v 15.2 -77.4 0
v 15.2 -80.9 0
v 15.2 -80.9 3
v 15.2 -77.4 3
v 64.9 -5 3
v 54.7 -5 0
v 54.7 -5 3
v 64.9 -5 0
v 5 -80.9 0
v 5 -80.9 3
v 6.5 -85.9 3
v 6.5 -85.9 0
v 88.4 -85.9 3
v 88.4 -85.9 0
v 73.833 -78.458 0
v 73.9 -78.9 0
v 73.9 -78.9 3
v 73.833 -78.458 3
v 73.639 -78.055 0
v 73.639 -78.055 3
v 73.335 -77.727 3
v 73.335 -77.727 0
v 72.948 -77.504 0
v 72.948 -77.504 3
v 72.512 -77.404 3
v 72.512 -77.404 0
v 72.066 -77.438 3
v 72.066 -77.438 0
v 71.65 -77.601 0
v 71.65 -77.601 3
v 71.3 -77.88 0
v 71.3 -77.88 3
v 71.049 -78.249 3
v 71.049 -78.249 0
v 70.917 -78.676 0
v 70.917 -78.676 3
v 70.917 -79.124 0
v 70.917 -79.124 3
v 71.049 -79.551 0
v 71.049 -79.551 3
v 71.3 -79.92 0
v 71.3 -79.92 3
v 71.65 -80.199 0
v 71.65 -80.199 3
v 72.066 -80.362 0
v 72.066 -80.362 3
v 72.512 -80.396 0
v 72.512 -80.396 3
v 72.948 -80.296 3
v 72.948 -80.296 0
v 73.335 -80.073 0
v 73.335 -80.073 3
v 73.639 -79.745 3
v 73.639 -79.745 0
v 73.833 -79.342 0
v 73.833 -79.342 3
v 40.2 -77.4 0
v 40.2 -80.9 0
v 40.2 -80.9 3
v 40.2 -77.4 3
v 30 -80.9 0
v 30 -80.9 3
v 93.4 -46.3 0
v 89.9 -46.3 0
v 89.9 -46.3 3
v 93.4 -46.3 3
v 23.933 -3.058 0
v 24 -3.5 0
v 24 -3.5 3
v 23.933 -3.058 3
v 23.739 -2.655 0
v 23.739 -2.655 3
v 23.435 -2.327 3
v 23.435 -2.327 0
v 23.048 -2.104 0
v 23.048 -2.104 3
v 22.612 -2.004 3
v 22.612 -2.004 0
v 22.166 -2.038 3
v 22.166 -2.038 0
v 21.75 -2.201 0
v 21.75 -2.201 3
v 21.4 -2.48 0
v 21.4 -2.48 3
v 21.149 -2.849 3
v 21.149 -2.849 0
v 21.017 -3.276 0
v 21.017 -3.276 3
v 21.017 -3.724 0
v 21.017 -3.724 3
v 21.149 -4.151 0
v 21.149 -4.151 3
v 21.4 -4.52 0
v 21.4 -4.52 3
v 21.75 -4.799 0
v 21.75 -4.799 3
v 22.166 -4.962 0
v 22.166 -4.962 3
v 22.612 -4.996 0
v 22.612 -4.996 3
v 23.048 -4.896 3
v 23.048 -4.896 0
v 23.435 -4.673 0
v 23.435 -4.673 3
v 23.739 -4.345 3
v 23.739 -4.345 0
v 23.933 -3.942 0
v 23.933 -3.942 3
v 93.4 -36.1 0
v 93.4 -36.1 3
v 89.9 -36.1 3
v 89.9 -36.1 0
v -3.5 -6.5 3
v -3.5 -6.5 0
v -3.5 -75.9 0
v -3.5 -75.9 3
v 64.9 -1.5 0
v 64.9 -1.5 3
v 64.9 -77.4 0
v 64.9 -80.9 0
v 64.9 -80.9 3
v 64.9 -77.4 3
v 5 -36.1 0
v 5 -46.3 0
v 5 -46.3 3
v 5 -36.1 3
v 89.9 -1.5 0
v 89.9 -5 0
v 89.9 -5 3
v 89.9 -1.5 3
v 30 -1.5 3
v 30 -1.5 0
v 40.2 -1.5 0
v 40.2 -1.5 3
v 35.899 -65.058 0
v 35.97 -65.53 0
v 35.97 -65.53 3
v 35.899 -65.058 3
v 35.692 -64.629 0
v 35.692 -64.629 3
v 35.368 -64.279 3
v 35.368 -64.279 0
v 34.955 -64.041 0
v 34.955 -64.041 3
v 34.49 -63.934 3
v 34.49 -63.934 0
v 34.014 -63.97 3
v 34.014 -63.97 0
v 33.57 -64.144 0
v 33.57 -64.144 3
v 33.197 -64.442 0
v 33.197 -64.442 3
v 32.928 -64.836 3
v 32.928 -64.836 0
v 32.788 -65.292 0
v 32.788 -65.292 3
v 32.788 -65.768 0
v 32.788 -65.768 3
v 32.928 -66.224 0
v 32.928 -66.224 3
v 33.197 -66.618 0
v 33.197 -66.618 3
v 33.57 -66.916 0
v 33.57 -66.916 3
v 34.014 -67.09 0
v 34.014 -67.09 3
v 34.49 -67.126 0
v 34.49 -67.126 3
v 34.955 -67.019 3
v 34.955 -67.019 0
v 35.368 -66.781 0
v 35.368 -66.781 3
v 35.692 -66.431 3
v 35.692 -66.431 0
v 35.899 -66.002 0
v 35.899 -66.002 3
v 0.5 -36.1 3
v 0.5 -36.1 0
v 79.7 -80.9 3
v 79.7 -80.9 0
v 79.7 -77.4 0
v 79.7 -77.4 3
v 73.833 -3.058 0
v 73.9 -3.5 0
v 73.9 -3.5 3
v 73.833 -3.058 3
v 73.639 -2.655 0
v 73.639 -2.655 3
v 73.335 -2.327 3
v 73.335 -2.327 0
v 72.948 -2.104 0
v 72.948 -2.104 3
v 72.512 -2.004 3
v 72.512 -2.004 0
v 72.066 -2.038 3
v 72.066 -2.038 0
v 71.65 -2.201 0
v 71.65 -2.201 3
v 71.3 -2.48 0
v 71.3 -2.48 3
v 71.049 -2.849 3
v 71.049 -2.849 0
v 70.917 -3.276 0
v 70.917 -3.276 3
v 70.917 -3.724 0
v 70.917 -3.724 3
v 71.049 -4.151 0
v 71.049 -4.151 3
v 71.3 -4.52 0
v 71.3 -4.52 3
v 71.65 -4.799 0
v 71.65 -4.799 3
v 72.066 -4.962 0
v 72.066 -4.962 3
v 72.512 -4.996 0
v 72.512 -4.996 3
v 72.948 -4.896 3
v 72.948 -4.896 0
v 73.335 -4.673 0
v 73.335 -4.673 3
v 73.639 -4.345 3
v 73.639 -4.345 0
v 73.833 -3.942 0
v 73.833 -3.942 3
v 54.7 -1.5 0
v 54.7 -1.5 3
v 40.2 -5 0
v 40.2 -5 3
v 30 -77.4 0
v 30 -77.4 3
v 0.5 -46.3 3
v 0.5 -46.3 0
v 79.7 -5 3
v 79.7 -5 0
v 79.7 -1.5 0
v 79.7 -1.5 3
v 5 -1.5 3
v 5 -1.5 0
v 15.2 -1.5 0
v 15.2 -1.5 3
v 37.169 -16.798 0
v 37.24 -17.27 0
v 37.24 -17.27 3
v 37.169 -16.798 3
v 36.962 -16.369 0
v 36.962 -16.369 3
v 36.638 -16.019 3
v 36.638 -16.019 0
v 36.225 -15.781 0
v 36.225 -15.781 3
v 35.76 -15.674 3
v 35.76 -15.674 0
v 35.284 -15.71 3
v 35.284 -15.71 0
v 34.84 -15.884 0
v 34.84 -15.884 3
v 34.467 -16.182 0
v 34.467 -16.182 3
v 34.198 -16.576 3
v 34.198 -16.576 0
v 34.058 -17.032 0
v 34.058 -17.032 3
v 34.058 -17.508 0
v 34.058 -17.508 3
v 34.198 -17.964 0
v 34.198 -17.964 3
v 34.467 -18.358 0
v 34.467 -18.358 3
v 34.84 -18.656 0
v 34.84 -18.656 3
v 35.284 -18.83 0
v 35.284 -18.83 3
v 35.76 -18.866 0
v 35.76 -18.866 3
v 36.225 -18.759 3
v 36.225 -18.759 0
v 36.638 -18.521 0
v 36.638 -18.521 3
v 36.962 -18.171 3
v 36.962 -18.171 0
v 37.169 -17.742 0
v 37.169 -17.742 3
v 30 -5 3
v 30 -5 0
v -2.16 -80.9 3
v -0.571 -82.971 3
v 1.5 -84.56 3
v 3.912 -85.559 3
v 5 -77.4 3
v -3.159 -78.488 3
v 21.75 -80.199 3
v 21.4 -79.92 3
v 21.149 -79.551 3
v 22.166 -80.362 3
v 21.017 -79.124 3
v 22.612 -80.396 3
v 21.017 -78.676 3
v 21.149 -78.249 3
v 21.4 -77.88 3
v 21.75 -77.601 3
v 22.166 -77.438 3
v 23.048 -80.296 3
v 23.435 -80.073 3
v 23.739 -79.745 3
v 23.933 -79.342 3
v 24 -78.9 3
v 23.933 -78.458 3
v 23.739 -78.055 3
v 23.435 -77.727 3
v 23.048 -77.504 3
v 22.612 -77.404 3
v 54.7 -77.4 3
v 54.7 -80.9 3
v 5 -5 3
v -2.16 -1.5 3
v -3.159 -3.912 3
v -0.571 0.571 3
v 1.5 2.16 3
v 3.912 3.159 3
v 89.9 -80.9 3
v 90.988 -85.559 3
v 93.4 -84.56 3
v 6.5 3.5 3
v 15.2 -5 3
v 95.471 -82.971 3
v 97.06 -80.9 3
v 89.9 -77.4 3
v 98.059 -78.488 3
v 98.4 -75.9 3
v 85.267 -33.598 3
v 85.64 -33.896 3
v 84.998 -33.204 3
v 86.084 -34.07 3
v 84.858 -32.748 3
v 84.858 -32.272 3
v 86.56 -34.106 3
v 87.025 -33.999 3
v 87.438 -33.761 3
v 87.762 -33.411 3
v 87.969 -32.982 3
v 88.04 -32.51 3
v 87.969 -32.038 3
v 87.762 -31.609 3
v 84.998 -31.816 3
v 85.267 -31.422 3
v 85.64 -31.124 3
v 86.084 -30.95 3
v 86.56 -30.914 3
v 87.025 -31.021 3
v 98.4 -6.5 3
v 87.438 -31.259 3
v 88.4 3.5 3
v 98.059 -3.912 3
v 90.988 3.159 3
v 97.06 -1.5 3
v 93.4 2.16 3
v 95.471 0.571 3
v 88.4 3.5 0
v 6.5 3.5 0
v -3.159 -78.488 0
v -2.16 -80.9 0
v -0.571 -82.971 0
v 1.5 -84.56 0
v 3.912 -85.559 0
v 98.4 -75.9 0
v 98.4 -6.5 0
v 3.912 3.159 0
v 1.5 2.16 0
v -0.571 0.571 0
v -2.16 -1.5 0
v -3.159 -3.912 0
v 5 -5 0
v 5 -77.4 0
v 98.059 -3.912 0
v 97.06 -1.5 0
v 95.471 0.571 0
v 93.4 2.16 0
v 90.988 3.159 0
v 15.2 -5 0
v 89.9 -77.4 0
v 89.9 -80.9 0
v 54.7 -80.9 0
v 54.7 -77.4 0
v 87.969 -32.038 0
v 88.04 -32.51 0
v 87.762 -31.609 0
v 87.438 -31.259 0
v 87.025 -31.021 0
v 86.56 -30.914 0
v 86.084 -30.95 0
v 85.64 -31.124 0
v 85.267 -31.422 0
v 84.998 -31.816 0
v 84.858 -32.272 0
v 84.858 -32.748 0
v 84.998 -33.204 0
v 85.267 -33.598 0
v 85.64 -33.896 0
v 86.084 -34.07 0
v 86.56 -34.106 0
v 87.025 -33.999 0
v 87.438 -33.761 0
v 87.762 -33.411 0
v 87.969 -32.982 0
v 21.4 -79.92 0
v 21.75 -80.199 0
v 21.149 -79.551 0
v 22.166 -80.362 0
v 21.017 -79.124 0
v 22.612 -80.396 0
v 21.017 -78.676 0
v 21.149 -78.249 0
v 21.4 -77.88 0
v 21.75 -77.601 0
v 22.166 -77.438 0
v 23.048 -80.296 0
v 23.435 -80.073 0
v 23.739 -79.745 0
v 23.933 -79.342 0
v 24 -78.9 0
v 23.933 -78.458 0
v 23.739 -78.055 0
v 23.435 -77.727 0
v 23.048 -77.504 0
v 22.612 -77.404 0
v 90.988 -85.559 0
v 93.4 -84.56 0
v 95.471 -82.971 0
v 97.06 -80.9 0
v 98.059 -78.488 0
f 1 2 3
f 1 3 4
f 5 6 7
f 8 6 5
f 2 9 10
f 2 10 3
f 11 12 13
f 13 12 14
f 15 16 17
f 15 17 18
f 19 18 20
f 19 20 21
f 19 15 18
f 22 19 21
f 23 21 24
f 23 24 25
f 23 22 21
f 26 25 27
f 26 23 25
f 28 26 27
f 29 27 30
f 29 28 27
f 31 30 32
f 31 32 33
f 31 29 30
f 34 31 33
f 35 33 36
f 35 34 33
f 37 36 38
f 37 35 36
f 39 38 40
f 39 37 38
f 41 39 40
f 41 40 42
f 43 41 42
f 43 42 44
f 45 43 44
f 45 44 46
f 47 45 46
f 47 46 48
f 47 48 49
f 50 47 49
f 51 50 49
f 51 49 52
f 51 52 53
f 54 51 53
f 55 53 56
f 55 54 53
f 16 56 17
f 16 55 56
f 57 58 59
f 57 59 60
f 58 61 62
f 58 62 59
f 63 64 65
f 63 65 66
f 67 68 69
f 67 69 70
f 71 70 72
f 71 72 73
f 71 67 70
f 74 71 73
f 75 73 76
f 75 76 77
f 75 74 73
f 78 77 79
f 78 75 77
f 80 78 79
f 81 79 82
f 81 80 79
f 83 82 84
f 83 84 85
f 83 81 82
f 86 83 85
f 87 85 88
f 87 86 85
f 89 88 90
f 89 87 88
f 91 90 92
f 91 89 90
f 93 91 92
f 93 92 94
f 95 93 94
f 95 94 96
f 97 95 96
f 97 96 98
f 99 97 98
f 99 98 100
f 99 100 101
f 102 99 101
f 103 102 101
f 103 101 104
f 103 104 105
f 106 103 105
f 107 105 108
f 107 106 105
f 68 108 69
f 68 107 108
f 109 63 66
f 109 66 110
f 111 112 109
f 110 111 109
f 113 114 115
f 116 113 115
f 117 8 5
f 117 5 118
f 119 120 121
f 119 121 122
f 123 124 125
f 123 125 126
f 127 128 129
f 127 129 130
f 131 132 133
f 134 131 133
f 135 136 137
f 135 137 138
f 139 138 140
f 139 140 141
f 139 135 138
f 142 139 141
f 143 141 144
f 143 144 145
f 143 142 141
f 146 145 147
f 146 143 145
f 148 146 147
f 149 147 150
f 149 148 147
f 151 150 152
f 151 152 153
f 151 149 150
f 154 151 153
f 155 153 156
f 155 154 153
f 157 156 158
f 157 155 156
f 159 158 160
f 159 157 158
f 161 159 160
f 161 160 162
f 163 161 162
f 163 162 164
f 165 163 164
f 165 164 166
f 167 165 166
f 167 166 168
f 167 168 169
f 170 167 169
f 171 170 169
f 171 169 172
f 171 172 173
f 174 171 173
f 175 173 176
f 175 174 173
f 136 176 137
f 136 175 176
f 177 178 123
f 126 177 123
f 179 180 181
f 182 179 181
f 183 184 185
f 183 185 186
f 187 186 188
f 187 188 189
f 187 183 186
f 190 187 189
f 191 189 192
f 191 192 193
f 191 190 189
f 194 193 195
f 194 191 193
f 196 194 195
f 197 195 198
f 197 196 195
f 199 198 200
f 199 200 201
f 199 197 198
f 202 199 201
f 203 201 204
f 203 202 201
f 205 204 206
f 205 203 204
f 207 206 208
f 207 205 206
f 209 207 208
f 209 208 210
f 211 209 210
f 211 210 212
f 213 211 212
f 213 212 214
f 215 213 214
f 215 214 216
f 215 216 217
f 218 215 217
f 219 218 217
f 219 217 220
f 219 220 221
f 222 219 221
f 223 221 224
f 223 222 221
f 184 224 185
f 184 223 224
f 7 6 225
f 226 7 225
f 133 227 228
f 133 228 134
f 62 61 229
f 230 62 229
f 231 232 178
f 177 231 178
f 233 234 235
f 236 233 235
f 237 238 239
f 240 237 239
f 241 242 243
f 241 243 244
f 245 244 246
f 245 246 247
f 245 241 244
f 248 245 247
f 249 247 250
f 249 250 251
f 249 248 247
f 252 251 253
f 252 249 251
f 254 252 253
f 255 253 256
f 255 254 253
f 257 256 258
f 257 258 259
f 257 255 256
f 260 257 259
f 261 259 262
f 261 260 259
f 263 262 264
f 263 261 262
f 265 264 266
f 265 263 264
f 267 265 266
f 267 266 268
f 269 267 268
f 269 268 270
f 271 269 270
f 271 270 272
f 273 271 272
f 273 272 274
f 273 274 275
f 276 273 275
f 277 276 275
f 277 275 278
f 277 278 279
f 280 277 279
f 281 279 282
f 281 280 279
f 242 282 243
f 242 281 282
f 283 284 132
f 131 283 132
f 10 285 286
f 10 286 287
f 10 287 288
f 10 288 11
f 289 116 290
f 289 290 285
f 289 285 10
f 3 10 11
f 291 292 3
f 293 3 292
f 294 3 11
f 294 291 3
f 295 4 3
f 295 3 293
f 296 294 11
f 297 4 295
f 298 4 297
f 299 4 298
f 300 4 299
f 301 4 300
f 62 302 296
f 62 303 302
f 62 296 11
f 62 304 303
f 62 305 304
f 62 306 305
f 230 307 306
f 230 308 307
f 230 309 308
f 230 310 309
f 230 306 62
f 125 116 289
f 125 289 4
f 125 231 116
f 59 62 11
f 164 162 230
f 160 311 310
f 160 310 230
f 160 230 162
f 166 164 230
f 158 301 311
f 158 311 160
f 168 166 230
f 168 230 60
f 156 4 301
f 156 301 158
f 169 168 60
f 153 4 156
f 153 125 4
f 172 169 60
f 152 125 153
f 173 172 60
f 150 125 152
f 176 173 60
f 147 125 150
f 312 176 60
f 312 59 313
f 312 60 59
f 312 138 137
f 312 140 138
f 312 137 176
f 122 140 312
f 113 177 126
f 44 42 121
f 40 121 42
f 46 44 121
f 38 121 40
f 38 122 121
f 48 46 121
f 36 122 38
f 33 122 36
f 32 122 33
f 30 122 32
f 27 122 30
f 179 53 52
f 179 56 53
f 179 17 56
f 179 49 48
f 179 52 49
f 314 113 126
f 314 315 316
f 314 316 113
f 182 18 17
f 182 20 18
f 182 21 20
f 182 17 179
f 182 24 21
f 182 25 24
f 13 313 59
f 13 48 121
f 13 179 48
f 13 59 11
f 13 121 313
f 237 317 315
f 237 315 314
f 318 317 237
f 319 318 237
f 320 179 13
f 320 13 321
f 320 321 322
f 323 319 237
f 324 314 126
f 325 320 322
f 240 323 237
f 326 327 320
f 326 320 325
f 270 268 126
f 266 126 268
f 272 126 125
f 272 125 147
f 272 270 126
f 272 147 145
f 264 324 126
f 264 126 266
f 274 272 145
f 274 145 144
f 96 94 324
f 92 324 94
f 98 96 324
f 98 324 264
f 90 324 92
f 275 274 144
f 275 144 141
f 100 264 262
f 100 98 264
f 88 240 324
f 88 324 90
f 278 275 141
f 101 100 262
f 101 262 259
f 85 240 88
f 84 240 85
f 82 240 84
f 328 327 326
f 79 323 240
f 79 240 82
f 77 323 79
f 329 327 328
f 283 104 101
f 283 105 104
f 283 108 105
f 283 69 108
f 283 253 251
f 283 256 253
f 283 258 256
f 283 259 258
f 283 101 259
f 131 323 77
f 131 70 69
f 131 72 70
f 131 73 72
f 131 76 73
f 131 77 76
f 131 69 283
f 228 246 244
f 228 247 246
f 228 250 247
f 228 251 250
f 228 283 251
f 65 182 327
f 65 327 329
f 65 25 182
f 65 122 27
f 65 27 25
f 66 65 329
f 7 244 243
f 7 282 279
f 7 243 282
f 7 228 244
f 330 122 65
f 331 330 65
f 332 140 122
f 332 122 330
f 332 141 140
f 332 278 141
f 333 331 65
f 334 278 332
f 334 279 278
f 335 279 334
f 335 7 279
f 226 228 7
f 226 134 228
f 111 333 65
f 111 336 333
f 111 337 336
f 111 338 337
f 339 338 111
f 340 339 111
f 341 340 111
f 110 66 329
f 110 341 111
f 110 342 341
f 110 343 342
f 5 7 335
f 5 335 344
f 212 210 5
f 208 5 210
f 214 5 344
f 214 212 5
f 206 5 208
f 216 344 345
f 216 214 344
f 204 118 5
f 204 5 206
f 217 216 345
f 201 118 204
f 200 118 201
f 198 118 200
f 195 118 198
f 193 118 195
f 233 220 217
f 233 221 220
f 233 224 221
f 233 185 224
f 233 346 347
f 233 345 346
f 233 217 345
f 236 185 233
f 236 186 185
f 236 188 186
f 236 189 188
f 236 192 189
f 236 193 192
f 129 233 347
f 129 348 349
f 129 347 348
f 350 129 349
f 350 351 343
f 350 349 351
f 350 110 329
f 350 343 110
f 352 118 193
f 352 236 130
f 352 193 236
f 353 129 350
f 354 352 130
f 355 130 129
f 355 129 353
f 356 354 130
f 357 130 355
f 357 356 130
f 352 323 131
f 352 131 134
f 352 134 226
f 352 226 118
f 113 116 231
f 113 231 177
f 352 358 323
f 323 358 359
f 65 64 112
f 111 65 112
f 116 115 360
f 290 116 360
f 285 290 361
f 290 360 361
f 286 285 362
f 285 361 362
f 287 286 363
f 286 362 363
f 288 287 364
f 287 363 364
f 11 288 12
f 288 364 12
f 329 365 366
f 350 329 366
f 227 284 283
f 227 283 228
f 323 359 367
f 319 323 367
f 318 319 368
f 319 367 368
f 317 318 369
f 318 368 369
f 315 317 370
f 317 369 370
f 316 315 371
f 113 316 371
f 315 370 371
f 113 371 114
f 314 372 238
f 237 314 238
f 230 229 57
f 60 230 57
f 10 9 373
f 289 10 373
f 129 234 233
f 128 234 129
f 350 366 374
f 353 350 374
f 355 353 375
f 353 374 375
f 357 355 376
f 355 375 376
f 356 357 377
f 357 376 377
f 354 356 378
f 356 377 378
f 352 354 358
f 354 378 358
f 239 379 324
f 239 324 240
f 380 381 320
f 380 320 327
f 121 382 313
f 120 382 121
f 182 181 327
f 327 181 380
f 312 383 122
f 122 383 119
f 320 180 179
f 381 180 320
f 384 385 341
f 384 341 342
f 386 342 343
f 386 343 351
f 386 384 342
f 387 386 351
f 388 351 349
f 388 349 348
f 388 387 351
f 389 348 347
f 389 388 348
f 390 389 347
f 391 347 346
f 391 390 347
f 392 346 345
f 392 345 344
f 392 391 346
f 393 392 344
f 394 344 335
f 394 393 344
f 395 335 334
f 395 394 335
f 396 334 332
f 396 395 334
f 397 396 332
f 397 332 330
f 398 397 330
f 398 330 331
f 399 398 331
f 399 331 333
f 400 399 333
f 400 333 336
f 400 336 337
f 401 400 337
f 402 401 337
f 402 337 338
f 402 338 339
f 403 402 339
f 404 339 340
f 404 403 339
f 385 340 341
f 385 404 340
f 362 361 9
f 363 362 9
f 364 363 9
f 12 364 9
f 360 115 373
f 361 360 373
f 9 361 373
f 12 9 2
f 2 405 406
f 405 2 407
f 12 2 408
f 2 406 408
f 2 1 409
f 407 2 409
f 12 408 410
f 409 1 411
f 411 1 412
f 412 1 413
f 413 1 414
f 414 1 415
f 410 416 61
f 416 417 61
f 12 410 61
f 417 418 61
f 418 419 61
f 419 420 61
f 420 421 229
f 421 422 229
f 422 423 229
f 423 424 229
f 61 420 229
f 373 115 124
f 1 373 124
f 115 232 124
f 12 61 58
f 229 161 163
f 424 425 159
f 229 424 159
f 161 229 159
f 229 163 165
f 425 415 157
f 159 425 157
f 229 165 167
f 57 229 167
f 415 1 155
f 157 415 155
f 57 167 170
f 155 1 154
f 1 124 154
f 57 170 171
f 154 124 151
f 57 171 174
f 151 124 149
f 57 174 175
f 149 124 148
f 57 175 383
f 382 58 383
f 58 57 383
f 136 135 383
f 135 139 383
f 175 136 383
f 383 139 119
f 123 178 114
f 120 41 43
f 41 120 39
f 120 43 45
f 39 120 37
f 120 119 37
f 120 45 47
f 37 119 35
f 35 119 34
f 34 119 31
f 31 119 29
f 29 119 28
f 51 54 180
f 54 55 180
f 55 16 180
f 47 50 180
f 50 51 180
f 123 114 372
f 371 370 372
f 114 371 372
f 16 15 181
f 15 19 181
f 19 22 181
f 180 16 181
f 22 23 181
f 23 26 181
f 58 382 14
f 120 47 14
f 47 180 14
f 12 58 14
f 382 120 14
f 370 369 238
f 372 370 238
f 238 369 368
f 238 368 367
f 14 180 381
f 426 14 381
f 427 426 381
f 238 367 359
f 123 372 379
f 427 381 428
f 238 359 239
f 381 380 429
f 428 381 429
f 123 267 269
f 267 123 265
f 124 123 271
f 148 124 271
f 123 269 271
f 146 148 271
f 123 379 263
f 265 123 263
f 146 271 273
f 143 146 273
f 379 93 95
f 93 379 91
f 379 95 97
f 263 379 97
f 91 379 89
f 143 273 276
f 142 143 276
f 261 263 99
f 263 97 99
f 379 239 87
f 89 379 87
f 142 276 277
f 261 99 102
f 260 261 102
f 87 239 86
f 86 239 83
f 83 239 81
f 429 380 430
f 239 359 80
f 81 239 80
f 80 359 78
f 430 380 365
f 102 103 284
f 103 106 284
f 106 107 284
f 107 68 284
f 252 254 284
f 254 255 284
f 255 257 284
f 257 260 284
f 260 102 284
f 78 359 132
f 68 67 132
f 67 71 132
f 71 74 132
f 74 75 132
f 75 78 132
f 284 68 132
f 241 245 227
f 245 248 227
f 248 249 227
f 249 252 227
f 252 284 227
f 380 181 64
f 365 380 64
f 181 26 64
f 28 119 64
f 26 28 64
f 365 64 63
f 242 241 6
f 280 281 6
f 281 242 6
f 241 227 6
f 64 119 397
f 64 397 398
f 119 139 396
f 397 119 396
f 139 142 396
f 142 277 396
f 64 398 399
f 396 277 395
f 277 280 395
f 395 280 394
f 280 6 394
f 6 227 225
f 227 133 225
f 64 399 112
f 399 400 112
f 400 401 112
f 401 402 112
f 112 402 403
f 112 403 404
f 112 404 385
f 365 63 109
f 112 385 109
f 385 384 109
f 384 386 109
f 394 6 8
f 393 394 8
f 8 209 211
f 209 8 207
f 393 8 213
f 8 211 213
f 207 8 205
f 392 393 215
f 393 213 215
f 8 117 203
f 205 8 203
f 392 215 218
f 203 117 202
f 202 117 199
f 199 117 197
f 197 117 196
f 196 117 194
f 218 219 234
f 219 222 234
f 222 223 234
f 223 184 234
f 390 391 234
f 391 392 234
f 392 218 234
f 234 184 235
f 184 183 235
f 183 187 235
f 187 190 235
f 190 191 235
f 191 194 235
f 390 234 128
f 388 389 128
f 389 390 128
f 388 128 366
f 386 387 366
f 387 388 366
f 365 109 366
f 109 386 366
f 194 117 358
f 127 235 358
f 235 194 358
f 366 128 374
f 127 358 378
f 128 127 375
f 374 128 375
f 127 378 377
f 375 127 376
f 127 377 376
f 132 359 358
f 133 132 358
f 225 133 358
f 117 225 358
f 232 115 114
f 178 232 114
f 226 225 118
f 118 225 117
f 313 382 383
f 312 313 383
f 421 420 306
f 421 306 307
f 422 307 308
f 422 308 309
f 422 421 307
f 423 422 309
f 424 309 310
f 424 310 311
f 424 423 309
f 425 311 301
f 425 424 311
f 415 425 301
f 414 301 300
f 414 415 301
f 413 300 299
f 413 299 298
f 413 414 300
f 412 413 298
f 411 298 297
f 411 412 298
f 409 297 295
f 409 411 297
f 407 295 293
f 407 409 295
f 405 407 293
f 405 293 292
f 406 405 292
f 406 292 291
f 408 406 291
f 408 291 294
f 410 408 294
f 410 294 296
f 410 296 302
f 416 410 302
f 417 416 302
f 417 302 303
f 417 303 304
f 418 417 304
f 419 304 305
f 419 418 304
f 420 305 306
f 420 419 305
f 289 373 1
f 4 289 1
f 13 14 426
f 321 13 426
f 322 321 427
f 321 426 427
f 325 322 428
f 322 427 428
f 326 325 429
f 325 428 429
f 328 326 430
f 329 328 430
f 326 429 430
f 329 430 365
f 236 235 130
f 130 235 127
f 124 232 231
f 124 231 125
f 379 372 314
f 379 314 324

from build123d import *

# Parameters (mm, degrees)
MODEL_R             = 1.6
MODEL_R_2           = 1.5
MODEL_W             = 10.2
MODEL_H             = 3.5
MODEL_W_2           = 4.5
MODEL_H_2           = 10.2
MODEL_W_3           = 3.5
BOSS_EXTRUDE1_DEPTH = 3


with BuildPart() as part:
    # Model → Boss-Extrude1 (new body)
    with BuildSketch(Plane.XY):
        with BuildLine():
            Line((6.5, -85.9), (88.4, -85.9))
            ThreePointArc((88.4, -85.9), (95.471067812, -82.971067812), (98.4, -75.9))
            Line((98.4, -75.9), (98.4, -6.5))
            ThreePointArc((98.4, -6.5), (95.471067812, 0.571067812), (88.4, 3.5))
            Line((88.4, 3.5), (6.5, 3.5))
            ThreePointArc((6.5, 3.5), (-0.571067812, 0.571067812), (-3.5, -6.5))
            Line((-3.5, -6.5), (-3.5, -75.9))
            ThreePointArc((-3.5, -75.9), (-0.571067812, -82.971067812), (6.5, -85.9))
        make_face()
        with Locations((35.64, -17.27)):
            Circle(MODEL_R, mode=Mode.SUBTRACT)
        with Locations((34.37, -65.53)):
            Circle(MODEL_R, mode=Mode.SUBTRACT)
        with Locations((22.5, -78.9)):
            Circle(MODEL_R_2, mode=Mode.SUBTRACT)
        with Locations((72.4, -3.5)):
            Circle(MODEL_R_2, mode=Mode.SUBTRACT)
        with Locations((22.5, -3.5)):
            Circle(MODEL_R_2, mode=Mode.SUBTRACT)
        with Locations((72.4, -78.9)):
            Circle(MODEL_R_2, mode=Mode.SUBTRACT)
        with Locations((86.44, -32.51)):
            Circle(MODEL_R, mode=Mode.SUBTRACT)
        with Locations((59.8, -79.15)):
            Rectangle(MODEL_W, MODEL_H, mode=Mode.SUBTRACT)
        with Locations((10.1, -79.15)):
            Rectangle(MODEL_W, MODEL_H, mode=Mode.SUBTRACT)
        with Locations((59.8, -3.25)):
            Rectangle(MODEL_W, MODEL_H, mode=Mode.SUBTRACT)
        with Locations((10.1, -3.25)):
            Rectangle(MODEL_W, MODEL_H, mode=Mode.SUBTRACT)
        with Locations((2.75, -41.2)):
            Rectangle(MODEL_W_2, MODEL_H_2, mode=Mode.SUBTRACT)
        with Locations((91.65, -41.2)):
            Rectangle(MODEL_W_3, MODEL_H_2, mode=Mode.SUBTRACT)
        with Locations((35.1, -3.25)):
            Rectangle(MODEL_W, MODEL_H, mode=Mode.SUBTRACT)
        with Locations((84.8, -3.25)):
            Rectangle(MODEL_W, MODEL_H, mode=Mode.SUBTRACT)
        with Locations((35.1, -79.15)):
            Rectangle(MODEL_W, MODEL_H, mode=Mode.SUBTRACT)
        with Locations((84.8, -79.15)):
            Rectangle(MODEL_W, MODEL_H, mode=Mode.SUBTRACT)
    extrude(amount=BOSS_EXTRUDE1_DEPTH)


solid = part.part
